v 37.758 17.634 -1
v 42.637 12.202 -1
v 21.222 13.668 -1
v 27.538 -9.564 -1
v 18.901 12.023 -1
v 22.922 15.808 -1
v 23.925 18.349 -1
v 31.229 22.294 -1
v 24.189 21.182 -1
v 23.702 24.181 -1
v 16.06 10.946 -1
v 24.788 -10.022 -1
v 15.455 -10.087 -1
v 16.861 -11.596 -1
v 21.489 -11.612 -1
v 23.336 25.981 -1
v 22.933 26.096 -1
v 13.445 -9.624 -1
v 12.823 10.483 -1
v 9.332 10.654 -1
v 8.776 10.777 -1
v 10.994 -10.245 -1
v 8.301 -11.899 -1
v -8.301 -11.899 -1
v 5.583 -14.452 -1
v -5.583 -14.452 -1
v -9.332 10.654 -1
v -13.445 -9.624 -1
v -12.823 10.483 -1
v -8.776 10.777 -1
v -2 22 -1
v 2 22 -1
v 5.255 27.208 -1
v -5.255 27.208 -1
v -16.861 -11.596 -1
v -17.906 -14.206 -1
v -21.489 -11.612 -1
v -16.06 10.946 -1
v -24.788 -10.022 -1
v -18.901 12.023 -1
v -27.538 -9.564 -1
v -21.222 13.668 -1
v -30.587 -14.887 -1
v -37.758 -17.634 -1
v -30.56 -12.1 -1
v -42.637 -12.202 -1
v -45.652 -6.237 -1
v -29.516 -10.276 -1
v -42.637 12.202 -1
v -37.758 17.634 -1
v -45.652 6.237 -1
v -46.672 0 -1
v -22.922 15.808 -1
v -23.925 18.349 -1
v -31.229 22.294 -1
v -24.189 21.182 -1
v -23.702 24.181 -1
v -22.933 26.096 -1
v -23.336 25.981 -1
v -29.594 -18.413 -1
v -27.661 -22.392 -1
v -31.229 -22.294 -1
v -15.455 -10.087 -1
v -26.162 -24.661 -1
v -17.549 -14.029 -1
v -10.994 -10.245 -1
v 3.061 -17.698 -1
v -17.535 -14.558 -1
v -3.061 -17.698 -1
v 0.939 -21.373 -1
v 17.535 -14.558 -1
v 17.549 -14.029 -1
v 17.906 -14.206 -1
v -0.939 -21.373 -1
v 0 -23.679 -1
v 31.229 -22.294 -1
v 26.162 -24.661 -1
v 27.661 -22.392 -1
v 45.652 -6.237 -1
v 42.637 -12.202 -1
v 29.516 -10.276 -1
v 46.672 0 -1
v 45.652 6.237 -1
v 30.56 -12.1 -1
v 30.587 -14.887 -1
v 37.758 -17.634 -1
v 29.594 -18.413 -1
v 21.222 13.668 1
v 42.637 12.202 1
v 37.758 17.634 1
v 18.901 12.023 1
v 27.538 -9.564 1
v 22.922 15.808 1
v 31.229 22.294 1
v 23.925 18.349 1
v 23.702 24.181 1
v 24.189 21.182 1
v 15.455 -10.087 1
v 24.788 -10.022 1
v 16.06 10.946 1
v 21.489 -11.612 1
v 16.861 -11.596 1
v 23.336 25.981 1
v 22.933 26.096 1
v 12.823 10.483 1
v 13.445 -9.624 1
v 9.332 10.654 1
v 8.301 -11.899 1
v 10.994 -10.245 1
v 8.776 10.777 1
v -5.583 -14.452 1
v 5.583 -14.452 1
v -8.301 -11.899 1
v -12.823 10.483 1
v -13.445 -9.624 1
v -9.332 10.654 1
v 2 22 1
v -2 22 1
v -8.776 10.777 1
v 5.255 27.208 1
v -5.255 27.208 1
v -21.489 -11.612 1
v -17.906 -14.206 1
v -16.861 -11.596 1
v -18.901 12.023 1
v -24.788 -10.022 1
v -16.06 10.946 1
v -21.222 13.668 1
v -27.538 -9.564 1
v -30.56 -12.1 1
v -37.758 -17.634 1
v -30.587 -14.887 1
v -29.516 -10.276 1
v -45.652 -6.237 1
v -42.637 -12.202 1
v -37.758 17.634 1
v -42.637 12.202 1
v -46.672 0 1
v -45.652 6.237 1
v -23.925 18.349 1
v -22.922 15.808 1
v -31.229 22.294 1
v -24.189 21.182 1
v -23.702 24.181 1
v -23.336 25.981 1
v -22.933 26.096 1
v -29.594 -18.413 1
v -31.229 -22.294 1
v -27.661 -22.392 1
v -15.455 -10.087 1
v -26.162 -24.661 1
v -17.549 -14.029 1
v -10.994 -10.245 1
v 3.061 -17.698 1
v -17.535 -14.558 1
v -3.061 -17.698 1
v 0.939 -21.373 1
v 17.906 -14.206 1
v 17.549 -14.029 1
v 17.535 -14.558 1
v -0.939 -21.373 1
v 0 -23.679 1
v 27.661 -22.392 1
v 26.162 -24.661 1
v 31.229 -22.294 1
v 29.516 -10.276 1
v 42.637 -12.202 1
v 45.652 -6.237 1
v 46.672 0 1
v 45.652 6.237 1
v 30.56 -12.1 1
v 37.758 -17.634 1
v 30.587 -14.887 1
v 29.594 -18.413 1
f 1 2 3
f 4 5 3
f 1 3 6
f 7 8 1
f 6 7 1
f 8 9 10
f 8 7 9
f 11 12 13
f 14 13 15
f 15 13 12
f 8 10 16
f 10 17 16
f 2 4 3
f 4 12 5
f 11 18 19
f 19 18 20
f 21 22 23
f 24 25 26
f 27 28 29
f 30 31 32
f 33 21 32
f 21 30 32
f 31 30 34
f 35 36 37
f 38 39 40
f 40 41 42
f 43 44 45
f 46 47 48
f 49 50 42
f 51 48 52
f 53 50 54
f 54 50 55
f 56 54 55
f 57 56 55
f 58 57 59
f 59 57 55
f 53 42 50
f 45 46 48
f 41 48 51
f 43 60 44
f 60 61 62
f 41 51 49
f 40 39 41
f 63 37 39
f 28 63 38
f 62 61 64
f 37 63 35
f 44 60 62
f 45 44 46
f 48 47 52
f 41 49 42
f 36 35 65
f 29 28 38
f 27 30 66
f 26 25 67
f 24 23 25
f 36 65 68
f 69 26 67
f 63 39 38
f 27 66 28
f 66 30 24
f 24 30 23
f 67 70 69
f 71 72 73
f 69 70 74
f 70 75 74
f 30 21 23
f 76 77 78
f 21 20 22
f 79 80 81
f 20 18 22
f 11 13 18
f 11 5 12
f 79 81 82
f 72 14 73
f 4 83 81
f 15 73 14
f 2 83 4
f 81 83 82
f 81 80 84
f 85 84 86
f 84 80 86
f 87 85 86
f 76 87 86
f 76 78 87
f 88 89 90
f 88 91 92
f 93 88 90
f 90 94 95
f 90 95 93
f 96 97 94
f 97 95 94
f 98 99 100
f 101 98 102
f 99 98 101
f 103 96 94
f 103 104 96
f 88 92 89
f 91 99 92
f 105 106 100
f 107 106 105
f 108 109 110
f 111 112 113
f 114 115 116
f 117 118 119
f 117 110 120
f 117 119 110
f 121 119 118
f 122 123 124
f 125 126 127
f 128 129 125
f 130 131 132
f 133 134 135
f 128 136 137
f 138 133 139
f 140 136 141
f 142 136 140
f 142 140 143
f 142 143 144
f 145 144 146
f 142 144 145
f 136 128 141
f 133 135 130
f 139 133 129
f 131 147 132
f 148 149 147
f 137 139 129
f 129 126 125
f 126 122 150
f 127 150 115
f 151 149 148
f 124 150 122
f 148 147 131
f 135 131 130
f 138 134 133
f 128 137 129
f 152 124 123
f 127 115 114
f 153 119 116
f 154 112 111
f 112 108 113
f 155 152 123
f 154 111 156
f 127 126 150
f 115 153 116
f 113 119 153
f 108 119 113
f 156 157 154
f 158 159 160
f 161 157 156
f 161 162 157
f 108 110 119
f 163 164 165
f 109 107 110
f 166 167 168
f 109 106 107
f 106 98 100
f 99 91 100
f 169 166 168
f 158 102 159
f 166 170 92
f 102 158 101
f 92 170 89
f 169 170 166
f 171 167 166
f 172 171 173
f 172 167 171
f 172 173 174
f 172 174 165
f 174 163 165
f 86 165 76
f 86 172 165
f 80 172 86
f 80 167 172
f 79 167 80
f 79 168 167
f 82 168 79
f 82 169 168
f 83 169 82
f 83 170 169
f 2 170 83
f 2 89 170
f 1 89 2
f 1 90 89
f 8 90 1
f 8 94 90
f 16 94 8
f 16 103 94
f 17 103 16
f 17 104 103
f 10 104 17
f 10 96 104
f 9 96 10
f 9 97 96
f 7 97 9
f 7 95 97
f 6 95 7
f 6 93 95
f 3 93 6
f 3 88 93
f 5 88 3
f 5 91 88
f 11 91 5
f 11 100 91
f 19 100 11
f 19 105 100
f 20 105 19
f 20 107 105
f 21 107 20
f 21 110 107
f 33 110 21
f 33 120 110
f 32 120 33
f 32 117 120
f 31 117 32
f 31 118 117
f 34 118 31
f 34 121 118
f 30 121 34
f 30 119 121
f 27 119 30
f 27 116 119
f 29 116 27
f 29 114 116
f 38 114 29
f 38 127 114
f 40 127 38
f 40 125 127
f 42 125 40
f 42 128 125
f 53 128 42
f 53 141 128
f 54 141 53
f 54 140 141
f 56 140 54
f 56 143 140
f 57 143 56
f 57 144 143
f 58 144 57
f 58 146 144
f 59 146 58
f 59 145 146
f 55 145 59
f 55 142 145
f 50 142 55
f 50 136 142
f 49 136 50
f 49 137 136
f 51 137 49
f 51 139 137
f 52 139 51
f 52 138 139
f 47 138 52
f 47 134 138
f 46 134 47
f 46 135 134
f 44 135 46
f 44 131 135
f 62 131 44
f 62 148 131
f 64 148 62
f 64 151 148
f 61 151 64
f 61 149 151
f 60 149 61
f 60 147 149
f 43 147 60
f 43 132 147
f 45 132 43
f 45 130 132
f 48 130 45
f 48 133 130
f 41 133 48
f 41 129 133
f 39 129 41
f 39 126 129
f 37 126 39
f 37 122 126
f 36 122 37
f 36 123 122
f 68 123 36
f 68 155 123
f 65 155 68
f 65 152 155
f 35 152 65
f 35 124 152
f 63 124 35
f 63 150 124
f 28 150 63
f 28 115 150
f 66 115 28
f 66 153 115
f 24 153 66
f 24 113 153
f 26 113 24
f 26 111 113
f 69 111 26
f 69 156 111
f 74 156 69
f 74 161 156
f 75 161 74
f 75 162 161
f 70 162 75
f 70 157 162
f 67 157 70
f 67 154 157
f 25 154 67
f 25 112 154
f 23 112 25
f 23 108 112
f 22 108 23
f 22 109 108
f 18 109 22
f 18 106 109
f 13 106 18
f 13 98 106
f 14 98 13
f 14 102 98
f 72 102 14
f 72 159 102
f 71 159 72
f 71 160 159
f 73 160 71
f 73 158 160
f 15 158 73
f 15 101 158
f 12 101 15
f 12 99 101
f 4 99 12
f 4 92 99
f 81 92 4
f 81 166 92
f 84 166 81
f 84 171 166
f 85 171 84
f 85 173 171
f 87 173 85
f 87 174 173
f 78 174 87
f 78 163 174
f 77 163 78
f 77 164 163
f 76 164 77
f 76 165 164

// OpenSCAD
linear_extrude(height = 2, center = true, convexity = 10, twist = 0) union(){ difference(){ translate([0,20,0]) polygon(points=[[-9.8, -14], [9.8,-14],[3.8, 14],[-3.8, 14] ],paths=[[0,1,2,3]], convexity=10); translate([0,30,0]) polygon(points=[[-2, -8], [2,-8],[12, 8],[-12, 8] ],paths=[[0,1,2,3]], convexity=10); } difference(){ projection(cut=true) rotate([0,50,0]) cylinder(r=30, h=200, center=true); translate([-8,-23,0]) rotate([0,0,-60]) projection(cut=true) rotate([0,62,0]) cylinder(r=7, h=200, center=true); translate([8,-23,0]) rotate([0,0,60]) projection(cut=true) rotate([0,62,0]) cylinder(r=7, h=200, center=true); translate([-18,-24,0]) rotate([0,0,-50]) projection(cut=true) rotate([0,67,0]) cylinder(r=7, h=200, center=true); translate([18,-24,0]) rotate([0,0,50]) projection(cut=true) rotate([0,67,0]) cylinder(r=7, h=200, center=true); translate([-7,25,0]) rotate([0,0,30]) projection(cut=true) rotate([0,45,0]) cylinder(r=13, h=200, center=true); translate([7,25,0]) rotate([0,0,-30]) projection(cut=true) rotate([0,45,0]) cylinder(r=13, h=200, center=true); } }
